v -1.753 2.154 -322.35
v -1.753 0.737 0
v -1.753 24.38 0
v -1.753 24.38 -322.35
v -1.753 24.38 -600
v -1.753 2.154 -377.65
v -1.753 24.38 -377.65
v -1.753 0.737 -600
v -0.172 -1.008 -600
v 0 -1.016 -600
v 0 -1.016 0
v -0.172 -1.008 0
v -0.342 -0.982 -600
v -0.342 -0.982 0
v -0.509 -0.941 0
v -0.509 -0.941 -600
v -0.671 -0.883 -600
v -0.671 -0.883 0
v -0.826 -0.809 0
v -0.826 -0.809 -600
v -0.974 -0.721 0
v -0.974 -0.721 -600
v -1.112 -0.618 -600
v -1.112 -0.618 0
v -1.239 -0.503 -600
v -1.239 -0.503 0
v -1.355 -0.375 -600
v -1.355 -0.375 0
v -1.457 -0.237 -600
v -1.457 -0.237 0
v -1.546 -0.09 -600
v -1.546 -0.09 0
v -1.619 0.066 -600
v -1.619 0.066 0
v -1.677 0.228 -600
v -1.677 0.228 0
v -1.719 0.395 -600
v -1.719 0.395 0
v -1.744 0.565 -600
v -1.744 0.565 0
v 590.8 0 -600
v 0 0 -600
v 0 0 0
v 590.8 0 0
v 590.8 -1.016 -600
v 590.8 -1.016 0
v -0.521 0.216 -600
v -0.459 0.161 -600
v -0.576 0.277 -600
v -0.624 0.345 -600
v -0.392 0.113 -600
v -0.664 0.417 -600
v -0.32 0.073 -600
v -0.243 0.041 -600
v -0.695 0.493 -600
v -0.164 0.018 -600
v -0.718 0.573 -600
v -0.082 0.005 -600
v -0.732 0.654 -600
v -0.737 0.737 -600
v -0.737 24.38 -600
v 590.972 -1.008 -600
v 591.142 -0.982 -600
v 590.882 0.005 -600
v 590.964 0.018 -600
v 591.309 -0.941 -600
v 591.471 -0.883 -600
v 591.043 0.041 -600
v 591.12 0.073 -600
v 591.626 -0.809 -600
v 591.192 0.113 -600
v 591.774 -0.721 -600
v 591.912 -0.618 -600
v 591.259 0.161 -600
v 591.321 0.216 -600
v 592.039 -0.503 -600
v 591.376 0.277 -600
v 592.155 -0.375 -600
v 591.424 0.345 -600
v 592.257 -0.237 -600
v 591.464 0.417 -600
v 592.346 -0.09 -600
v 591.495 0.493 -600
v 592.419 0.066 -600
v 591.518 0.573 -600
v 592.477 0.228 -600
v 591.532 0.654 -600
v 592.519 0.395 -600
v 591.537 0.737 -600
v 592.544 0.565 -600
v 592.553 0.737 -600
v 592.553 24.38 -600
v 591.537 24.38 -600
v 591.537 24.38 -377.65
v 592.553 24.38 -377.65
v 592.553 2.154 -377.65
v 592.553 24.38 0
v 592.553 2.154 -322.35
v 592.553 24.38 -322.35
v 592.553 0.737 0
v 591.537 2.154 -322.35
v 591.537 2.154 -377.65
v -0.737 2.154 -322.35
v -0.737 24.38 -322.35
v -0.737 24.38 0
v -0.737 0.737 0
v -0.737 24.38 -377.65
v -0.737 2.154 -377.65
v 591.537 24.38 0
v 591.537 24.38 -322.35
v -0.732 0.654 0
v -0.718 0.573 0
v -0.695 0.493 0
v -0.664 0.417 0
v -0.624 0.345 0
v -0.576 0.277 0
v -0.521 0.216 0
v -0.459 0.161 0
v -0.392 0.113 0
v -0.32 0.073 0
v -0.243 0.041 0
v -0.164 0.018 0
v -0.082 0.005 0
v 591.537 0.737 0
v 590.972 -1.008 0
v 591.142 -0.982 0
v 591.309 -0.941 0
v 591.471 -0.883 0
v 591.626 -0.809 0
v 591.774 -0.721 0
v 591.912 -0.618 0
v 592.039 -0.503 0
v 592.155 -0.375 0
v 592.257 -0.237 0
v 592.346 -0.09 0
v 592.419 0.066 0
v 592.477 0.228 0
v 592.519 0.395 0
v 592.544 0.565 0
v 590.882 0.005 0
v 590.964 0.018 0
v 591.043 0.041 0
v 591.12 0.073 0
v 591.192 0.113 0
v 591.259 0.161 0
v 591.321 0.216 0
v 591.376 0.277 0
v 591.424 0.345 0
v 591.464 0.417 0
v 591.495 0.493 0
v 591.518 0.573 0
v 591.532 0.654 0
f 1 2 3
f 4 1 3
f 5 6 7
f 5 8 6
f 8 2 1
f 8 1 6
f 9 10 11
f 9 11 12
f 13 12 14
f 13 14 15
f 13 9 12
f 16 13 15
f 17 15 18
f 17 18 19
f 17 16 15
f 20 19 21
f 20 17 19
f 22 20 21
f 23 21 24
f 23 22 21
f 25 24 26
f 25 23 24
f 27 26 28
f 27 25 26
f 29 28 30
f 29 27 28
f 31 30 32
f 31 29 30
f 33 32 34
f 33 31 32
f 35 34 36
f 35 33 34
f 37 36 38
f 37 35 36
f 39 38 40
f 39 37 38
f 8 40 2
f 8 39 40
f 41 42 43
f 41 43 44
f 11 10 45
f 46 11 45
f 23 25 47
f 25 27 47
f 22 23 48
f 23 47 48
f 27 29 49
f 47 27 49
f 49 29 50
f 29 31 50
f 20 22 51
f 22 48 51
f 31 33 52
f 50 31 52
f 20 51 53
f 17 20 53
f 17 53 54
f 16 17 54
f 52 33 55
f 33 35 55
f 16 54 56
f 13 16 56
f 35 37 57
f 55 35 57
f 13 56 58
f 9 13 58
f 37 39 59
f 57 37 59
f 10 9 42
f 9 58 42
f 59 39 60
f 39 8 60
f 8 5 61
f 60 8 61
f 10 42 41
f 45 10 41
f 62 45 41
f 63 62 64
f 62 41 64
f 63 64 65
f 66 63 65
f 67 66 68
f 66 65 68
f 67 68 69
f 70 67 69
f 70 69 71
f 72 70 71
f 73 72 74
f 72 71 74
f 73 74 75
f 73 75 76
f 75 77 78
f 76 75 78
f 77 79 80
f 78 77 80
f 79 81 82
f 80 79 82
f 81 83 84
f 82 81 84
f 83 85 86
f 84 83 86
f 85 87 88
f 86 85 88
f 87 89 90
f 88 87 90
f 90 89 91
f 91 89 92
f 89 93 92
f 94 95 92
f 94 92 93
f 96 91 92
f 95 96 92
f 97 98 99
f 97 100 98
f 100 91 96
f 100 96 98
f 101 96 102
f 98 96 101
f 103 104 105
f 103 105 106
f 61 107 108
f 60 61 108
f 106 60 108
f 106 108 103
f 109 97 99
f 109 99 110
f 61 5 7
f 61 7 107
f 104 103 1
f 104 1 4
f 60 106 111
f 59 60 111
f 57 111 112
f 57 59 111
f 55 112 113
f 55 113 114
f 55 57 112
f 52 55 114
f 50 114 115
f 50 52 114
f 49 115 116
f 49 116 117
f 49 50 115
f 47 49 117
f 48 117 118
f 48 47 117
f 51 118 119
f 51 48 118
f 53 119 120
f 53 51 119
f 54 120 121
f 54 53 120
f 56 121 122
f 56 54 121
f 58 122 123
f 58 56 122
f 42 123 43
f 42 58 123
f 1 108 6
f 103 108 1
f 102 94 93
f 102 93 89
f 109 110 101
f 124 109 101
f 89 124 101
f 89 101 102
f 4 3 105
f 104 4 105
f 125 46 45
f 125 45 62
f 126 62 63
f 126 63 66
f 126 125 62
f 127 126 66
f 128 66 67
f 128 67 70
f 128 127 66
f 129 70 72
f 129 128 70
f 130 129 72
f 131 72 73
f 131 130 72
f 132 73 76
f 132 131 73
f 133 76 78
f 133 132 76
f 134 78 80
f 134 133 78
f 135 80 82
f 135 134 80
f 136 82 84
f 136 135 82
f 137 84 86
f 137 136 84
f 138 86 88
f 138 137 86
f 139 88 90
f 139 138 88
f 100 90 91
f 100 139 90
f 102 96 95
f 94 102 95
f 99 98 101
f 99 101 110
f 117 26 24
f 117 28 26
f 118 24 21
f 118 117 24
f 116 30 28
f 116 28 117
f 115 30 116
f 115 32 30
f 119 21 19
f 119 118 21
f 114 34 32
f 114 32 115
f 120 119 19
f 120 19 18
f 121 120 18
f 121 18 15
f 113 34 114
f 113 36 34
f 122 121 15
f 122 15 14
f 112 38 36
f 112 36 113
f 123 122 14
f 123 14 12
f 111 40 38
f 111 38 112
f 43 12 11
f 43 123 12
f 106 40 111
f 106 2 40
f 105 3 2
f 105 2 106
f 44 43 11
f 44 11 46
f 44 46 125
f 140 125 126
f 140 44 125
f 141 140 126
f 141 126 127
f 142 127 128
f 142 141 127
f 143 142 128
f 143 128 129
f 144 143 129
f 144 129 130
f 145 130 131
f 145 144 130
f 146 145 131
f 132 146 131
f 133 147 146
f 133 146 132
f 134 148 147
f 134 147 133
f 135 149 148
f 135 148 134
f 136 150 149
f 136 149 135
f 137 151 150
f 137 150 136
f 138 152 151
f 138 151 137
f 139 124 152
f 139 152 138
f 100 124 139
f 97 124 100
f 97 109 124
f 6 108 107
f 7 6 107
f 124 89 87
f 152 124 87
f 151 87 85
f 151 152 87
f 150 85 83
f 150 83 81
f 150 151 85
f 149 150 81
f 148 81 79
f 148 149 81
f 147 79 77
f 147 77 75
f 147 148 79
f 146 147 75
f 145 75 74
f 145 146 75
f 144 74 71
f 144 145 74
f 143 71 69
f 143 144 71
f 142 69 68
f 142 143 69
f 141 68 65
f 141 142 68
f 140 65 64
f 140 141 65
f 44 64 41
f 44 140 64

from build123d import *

# Parameters (mm, degrees)
SKETCH2_W               = 590.8
SKETCH2_H               = 600
BASE_FLANGE1_DEPTH      = 1.016
EDGE_FLANGE1_DEPTH      = 600
EDGE_FLANGE1_BEND_DEPTH = 600
CUT_EXTRUDE1_DEPTH      = 845.862743377
CUT_EXTRUDE1_DEPTH_BACK = 845.862743377
SKETCH31_W              = 55.3
SKETCH31_H              = 22.226


# Sheet-metal steps are written as plain solids
with BuildPart() as part:
    # Sketch2 → Base-Flange1 (new body)
    with BuildSketch(Plane(origin=(0, 0, 0), x_dir=(1, 0, 0), z_dir=(0, 1, 0))):
        with Locations((295.4, 300)):
            Rectangle(SKETCH2_W, SKETCH2_H)
    extrude(amount=-BASE_FLANGE1_DEPTH)

    # Edge-Flange1 section (across the edge) → Edge-Flange1 (add)
    with BuildSketch(Plane(origin=(-0.7366, 0, -600), x_dir=(1, 0, 0), z_dir=(0, 0, 1))):
        with BuildLine():
            Line((-1.016, 0.7366), (-1.016, 24.38))
            Line((-1.016, 24.38), (0, 24.38))
            Line((0, 24.38), (0, 0.7366))
            ThreePointArc((0, 0.7366), (0.215745145, 0.215745145), (0.7366, 0))
            Line((0.7366, 0), (0.7366, -1.016))
            ThreePointArc((0.7366, -1.016), (-0.502675345, -0.502675345), (-1.016, 0.7366))
        make_face()
    extrude(amount=EDGE_FLANGE1_DEPTH)

    # Edge-Flange1 section 2 (across the edge) → Edge-Flange1 bend (add)
    with BuildSketch(Plane(origin=(591.5366, 0, 0), x_dir=(-1, 0, 0), z_dir=(0, 0, -1))):
        with BuildLine():
            Line((-1.016, 0.7366), (-1.016, 24.38))
            Line((-1.016, 24.38), (0, 24.38))
            Line((0, 24.38), (0, 0.7366))
            ThreePointArc((0, 0.7366), (0.215745145, 0.215745145), (0.7366, 0))
            Line((0.7366, 0), (0.7366, -1.016))
            ThreePointArc((0.7366, -1.016), (-0.502675345, -0.502675345), (-1.016, 0.7366))
        make_face()
    extrude(amount=EDGE_FLANGE1_BEND_DEPTH)

    # Sketch31 → Cut-Extrude1 (cut, two sides: drawn at the far end of the back side and taken through both)
    with BuildSketch(Plane.ZY.offset(1.7526).offset(-CUT_EXTRUDE1_DEPTH_BACK)):
        with Locations((-350, 13.267)):
            Rectangle(SKETCH31_W, SKETCH31_H)
    extrude(amount=CUT_EXTRUDE1_DEPTH + CUT_EXTRUDE1_DEPTH_BACK, mode=Mode.SUBTRACT)


solid = part.part
